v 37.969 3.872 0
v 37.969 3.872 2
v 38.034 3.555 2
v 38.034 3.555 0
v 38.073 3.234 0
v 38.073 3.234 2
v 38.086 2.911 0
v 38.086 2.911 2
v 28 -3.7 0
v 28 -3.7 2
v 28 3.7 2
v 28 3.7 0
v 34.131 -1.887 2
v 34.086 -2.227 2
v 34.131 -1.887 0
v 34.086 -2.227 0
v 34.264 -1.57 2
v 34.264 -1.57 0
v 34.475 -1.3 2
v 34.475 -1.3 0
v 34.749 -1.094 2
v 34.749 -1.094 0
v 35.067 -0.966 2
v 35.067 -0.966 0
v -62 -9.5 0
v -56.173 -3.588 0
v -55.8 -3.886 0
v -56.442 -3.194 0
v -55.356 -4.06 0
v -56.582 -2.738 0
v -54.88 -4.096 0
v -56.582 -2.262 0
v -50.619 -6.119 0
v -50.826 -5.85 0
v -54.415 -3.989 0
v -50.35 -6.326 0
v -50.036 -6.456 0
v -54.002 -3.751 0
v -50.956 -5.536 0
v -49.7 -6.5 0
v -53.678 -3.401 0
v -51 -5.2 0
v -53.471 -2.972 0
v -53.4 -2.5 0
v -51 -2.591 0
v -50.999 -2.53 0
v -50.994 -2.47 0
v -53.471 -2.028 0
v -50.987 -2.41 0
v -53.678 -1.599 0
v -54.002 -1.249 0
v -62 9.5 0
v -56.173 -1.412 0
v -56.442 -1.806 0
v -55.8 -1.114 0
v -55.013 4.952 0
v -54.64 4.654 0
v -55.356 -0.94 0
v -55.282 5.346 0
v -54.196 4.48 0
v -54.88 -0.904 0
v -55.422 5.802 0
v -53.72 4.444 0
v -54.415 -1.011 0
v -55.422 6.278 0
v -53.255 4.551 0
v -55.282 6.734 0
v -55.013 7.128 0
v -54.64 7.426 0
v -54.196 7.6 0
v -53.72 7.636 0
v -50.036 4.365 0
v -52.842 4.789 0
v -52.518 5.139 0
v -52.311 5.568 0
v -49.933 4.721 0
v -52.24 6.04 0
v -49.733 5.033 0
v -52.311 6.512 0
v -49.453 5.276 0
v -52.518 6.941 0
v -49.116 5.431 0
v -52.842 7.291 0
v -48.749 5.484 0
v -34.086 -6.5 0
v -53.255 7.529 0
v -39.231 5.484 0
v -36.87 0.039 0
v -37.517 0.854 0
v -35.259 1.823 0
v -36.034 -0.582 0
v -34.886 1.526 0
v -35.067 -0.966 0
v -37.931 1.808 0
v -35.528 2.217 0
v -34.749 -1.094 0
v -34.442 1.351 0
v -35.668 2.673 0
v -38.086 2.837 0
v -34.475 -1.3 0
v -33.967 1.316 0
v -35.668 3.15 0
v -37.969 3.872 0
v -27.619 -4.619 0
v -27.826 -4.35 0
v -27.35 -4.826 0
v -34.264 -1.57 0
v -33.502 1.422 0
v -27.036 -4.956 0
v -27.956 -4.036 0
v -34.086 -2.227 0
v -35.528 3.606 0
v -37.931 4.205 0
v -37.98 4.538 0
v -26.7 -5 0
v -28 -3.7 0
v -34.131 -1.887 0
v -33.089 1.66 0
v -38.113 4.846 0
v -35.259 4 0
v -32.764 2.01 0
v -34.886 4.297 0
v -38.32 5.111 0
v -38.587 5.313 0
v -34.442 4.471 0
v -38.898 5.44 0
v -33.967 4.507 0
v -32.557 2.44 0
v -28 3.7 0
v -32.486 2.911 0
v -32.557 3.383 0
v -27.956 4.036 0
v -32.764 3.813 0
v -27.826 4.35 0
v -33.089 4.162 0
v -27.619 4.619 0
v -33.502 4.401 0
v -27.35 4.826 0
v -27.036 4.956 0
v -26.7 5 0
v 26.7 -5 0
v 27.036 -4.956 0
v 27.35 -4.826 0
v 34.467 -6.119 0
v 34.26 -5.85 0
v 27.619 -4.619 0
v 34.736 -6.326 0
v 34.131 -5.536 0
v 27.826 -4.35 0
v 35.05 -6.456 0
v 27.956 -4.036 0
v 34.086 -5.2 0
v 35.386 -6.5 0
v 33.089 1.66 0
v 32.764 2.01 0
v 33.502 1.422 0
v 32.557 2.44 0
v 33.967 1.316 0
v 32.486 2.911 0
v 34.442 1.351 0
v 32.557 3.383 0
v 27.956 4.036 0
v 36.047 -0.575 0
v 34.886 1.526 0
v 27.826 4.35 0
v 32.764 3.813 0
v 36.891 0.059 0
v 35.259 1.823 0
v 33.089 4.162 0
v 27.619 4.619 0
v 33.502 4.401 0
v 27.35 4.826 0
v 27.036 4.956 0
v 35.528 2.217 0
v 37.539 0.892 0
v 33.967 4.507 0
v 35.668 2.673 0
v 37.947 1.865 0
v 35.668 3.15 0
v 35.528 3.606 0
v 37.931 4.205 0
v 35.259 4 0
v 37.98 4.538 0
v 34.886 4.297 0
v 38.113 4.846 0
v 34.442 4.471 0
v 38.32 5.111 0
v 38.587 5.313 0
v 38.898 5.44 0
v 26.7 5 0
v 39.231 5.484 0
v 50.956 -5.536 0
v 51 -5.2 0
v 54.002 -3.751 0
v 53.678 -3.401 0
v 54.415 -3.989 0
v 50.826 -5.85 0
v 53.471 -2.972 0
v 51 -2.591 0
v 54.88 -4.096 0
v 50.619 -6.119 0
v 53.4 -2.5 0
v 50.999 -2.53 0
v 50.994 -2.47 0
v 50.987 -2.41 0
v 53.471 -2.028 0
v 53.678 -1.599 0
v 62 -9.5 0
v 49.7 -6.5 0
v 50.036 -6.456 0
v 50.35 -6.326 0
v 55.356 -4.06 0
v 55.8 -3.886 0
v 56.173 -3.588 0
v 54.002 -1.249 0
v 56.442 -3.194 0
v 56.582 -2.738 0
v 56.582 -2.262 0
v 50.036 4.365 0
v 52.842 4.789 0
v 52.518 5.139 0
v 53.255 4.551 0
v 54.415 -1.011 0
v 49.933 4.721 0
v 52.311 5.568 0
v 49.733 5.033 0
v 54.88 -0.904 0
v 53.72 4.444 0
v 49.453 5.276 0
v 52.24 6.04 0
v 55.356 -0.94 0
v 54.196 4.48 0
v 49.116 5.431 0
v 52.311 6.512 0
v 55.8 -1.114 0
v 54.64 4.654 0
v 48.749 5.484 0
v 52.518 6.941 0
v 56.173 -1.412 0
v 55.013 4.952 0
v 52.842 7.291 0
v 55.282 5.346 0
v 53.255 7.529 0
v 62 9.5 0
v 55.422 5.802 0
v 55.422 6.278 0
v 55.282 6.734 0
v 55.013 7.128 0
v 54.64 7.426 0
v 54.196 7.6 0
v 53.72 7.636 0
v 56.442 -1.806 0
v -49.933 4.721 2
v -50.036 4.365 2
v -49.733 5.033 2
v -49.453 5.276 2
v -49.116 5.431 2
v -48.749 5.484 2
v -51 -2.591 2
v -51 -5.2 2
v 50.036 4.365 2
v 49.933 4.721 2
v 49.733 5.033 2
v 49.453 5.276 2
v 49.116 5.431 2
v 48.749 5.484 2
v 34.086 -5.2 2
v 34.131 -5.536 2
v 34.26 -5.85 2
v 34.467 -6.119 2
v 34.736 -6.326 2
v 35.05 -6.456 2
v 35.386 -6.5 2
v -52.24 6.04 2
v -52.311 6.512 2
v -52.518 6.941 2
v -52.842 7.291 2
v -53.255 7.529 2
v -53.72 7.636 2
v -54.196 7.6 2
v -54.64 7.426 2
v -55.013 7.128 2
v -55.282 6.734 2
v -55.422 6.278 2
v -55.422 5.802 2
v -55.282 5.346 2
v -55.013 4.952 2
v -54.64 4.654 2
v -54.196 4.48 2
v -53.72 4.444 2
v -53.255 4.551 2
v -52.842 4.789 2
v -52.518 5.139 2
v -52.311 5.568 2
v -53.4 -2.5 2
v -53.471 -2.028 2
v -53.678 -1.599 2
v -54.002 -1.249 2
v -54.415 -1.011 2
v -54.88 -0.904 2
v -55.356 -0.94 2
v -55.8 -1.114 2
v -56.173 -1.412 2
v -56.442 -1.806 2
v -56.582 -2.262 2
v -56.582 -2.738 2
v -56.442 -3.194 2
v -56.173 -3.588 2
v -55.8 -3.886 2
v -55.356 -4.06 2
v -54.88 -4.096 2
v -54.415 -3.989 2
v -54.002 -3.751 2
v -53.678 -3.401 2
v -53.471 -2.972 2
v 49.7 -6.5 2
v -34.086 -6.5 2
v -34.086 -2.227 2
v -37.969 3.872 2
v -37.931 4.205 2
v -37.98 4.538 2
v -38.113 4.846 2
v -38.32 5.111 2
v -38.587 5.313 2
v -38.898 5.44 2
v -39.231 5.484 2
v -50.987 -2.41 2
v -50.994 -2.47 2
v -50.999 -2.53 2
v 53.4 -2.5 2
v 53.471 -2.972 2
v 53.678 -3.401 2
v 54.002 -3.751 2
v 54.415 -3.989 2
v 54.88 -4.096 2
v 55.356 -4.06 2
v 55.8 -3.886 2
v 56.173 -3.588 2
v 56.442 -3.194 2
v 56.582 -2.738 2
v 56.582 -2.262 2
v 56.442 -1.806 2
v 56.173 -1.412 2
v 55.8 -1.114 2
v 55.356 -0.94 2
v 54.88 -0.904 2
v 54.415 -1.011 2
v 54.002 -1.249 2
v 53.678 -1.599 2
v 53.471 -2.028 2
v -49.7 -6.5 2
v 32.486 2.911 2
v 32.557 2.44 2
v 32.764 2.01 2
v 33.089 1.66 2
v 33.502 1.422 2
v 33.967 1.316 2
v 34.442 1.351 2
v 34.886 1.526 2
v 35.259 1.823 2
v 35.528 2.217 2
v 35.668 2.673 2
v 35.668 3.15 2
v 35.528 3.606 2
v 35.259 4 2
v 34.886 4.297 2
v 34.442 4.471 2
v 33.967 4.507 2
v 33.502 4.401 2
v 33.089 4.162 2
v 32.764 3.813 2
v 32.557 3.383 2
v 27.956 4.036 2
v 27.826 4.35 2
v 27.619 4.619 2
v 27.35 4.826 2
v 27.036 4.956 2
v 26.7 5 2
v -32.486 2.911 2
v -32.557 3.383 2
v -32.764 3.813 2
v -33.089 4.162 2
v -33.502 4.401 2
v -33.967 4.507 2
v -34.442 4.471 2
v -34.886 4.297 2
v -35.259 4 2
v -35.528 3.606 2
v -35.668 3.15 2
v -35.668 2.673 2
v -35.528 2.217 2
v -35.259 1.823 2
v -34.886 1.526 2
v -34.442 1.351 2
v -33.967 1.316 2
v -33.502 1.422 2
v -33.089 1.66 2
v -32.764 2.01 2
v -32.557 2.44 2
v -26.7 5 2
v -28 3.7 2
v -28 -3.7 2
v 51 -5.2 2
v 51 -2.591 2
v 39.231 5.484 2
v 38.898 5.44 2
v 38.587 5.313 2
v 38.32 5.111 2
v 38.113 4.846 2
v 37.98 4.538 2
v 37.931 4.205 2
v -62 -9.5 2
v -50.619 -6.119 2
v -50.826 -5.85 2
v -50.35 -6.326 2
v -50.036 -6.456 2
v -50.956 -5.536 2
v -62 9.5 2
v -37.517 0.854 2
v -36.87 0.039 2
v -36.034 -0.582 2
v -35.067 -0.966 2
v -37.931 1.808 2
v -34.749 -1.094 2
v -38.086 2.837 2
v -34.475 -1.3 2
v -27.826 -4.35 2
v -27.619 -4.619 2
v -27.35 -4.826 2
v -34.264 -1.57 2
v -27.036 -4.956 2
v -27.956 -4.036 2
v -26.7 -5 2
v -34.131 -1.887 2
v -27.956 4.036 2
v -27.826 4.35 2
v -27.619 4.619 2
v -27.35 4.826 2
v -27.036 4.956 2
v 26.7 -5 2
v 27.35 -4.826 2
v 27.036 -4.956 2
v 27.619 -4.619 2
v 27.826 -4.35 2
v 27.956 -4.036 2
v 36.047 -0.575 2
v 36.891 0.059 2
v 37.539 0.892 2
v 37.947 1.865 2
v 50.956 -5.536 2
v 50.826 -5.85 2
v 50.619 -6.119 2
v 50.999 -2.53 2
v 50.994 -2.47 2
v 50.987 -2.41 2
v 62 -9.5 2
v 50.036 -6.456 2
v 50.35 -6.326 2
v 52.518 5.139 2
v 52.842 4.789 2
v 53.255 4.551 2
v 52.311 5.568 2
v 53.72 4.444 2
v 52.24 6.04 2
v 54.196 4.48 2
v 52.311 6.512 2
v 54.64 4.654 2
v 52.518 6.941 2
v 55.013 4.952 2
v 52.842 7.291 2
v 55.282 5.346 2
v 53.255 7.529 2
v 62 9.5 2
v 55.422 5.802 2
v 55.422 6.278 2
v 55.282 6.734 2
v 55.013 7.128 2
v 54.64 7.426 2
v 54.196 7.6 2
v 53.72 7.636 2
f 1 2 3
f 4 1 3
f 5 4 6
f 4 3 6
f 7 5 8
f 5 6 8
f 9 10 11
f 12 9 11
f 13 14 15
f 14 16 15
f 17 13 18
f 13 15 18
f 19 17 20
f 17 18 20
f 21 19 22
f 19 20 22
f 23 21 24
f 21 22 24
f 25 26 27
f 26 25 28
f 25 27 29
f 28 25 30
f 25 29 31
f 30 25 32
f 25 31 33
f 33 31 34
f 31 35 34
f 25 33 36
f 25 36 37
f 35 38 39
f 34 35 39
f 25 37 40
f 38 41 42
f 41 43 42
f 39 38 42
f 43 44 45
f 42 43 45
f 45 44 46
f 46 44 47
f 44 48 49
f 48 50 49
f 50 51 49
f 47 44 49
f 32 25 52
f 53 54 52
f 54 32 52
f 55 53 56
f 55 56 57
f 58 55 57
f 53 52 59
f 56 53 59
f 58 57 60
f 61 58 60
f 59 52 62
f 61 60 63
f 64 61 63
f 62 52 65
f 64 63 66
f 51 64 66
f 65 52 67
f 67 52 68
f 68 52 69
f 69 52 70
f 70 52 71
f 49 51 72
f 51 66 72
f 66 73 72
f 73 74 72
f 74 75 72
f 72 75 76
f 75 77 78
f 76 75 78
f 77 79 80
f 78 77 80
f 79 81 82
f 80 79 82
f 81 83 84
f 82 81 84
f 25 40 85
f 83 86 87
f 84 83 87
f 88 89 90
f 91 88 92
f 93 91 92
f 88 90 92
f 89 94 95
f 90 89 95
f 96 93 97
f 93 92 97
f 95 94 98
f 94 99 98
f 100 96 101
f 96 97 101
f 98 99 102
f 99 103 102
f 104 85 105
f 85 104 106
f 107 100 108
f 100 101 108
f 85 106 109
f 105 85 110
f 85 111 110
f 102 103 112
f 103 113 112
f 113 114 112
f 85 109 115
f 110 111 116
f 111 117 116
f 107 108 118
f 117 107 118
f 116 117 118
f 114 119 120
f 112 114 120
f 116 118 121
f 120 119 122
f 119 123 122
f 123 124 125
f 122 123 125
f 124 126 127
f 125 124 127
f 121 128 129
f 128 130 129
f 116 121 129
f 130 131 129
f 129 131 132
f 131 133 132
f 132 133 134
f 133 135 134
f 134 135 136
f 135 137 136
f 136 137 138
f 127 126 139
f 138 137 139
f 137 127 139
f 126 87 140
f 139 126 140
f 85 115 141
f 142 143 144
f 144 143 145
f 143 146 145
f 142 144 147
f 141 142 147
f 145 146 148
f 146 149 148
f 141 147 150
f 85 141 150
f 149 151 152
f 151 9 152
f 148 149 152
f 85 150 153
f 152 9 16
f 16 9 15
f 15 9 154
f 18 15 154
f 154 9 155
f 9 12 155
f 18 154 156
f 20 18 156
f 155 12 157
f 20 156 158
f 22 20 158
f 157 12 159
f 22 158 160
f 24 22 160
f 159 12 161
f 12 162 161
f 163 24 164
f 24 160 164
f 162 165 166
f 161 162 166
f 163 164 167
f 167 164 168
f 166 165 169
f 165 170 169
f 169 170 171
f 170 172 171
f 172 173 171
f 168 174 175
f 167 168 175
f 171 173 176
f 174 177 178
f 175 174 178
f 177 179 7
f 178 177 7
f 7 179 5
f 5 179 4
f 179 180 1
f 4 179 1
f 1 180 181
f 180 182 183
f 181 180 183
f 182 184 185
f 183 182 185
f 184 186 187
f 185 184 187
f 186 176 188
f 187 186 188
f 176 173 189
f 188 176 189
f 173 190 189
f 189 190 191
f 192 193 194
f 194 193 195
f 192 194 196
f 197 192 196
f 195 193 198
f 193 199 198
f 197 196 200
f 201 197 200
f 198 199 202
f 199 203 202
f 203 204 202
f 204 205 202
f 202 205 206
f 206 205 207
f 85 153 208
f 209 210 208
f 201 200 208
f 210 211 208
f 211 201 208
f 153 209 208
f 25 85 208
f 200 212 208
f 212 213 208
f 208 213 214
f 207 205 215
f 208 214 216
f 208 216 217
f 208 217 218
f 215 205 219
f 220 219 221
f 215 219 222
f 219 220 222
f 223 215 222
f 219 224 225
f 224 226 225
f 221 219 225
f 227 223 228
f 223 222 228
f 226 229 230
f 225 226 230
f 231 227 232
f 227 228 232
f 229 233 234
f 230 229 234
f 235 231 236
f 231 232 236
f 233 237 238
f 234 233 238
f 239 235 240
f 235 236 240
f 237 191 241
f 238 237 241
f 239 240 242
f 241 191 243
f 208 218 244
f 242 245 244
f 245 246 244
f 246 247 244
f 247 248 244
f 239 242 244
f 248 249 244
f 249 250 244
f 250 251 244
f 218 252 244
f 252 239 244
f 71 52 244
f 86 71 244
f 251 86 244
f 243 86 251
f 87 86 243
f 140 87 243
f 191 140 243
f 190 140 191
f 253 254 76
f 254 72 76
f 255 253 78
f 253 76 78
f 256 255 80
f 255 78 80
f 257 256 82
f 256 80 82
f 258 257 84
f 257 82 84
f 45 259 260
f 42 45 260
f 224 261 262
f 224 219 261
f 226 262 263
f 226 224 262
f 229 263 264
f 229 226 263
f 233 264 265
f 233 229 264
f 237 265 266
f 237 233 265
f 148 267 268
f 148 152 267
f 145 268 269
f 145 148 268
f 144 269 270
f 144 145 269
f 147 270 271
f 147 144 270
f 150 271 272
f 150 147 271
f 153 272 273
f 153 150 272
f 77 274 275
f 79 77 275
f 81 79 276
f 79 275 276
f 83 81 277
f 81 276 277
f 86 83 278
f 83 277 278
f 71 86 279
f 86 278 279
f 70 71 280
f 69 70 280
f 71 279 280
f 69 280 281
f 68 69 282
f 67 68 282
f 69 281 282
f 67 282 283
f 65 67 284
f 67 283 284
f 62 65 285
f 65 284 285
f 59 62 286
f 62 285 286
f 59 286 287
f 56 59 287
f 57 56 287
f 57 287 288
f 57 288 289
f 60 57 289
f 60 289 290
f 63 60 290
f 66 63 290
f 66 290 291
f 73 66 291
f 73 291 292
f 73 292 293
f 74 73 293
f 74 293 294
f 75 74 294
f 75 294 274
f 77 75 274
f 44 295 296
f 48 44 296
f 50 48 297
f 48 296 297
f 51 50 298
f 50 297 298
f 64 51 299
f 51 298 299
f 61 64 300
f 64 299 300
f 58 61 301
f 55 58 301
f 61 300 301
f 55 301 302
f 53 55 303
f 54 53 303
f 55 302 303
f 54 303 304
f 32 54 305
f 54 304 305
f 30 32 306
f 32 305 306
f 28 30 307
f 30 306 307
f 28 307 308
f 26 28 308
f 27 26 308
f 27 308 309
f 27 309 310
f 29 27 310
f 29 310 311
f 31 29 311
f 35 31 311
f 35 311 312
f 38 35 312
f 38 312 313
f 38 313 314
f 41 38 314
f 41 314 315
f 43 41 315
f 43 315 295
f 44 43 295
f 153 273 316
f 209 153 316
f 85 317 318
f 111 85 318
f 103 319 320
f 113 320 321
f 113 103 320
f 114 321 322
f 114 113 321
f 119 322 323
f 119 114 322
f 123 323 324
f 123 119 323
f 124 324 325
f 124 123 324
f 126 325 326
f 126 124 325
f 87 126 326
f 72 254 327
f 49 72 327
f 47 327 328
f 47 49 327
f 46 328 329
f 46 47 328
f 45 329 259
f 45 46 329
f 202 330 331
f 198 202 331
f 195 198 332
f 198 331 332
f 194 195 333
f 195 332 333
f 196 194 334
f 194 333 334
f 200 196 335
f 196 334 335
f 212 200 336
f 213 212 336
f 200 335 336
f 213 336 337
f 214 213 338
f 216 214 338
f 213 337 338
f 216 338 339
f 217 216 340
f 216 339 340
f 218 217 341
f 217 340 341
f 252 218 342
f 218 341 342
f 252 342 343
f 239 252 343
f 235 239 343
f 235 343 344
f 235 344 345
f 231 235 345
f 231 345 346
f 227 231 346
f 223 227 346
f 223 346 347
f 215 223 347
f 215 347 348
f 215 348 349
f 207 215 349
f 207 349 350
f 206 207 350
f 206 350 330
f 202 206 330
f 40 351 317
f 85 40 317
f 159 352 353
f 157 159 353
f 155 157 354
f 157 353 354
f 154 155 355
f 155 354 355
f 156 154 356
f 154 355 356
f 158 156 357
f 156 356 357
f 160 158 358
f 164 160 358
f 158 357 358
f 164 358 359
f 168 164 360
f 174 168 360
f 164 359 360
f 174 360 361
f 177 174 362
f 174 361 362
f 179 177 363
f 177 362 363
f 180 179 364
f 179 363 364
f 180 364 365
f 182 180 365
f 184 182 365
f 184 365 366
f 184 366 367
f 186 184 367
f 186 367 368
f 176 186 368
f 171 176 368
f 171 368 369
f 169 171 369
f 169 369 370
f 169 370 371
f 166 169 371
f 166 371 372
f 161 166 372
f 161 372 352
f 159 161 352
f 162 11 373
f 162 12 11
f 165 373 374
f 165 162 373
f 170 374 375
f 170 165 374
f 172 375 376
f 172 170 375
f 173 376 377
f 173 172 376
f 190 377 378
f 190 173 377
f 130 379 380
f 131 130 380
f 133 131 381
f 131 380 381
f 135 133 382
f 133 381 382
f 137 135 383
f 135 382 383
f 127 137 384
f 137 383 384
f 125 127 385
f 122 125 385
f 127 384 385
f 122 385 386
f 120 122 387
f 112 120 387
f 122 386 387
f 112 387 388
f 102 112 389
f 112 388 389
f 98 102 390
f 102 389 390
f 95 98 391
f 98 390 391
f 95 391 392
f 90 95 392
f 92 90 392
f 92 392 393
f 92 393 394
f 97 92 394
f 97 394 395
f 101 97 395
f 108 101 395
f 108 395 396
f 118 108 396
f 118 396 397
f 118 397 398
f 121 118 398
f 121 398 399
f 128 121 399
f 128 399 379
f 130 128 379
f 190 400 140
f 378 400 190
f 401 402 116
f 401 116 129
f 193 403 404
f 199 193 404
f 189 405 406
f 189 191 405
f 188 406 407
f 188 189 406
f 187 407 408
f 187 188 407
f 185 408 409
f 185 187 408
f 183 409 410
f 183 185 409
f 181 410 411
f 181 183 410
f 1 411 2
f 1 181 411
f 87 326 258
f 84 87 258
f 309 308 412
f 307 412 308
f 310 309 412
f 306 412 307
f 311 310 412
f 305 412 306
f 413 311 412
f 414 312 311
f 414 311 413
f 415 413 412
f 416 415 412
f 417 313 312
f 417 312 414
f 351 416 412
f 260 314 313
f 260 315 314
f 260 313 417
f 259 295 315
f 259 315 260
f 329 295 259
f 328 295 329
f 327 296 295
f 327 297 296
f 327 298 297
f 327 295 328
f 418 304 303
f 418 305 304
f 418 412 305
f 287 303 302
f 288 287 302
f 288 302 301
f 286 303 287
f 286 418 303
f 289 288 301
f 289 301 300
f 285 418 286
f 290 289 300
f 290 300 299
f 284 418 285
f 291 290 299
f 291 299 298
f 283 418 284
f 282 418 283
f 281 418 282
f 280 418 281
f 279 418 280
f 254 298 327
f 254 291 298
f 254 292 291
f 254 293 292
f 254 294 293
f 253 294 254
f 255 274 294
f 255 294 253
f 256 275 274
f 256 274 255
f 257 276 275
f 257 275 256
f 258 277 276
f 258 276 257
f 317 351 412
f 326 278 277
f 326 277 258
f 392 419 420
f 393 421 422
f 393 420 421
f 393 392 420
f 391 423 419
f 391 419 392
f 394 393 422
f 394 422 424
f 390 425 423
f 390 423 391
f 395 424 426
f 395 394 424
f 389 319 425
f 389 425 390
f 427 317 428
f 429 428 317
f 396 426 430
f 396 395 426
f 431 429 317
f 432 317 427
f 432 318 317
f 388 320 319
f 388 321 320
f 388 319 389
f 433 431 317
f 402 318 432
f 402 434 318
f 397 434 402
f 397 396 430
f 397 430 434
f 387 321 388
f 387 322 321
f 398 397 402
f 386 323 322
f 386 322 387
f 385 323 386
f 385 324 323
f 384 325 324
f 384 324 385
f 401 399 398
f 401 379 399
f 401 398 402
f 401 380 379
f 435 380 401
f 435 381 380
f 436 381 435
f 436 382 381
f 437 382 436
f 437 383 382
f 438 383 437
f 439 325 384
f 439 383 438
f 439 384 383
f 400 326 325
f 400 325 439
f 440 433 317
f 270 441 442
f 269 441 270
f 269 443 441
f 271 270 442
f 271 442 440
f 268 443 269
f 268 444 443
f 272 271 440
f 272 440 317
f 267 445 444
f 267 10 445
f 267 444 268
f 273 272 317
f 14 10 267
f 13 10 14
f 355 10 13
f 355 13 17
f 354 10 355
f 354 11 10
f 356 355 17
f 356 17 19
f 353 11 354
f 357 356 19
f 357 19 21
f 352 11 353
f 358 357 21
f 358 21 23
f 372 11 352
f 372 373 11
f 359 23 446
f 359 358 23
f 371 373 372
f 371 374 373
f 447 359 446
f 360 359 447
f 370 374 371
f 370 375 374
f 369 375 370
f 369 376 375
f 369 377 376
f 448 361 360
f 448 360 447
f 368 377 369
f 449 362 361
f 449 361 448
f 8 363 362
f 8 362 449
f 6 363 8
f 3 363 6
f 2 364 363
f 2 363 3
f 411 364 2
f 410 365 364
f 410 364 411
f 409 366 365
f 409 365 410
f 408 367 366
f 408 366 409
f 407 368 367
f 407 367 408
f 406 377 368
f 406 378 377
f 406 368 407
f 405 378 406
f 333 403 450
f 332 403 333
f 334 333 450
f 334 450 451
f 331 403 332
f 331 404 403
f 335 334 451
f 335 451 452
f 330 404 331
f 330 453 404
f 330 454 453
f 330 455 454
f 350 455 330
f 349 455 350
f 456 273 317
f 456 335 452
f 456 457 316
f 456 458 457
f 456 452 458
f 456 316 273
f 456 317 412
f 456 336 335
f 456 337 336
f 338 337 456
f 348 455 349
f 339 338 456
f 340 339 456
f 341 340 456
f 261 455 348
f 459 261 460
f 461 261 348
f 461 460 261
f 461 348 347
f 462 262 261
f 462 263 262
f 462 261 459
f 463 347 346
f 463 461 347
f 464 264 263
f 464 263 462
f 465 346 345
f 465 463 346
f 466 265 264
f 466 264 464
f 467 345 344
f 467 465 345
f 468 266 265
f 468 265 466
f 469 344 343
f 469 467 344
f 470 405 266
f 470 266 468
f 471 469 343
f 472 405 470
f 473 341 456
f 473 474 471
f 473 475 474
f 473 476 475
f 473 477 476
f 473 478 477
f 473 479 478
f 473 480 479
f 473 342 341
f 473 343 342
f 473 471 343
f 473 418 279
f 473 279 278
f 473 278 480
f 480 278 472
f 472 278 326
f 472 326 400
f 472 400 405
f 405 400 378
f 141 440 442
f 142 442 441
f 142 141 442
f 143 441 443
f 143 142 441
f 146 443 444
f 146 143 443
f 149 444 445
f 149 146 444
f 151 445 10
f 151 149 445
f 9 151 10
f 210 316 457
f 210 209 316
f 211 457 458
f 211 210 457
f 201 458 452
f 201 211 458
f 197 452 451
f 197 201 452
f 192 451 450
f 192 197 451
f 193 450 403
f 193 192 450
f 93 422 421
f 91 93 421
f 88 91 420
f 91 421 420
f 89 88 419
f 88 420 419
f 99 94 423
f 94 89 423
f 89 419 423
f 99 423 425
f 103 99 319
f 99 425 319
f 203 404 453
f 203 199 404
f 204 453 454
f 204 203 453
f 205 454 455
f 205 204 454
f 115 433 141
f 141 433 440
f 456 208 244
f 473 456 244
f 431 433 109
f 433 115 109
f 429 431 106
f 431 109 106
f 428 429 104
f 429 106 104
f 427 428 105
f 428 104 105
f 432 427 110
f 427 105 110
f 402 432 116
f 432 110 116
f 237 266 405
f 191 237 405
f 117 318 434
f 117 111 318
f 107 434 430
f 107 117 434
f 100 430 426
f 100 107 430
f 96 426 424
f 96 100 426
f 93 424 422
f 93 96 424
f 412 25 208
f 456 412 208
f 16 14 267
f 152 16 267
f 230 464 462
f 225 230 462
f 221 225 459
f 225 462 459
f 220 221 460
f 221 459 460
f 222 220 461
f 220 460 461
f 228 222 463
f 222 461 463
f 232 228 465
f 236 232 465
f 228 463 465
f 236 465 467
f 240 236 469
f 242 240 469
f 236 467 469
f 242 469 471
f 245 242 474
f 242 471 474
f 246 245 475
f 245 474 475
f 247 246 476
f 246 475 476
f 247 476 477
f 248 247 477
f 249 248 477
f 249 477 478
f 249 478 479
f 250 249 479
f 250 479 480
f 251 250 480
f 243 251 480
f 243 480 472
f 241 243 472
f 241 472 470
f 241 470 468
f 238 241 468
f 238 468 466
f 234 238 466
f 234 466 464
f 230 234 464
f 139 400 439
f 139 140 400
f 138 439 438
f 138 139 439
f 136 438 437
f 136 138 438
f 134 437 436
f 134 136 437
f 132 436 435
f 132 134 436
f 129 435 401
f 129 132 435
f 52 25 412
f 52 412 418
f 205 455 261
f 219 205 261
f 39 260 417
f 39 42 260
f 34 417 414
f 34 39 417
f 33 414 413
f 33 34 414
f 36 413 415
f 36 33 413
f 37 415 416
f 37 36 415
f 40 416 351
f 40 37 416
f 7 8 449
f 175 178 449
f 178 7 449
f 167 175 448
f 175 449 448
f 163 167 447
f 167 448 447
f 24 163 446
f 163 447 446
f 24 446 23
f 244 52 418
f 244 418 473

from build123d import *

# Parameters (mm, degrees)
SKETCH_1_W          = 124
SKETCH_1_H          = 19
EXTRUDE_1_DEPTH     = 2
SKETCH_3_R          = 1.6
CUT_EXTRUDE_2_DEPTH = 63.755477849
SKETCH_4_R          = 1.6
CUT_EXTRUDE_3_DEPTH = 63.755477849
SKETCH_5_W          = 56
SKETCH_5_H          = 10
CUT_EXTRUDE_4_DEPTH = 63.755477849
FILLET_1_R          = 1.3


with BuildPart() as part:
    # 草图1 → 凸台-拉伸1 (new body)
    with BuildSketch(Plane.XY):
        Rectangle(SKETCH_1_W, SKETCH_1_H)
    extrude(amount=EXTRUDE_1_DEPTH)

    # 草图3 → 切除-拉伸2 (cut, through all)
    with BuildSketch(Plane.XY.offset(2)):
        with Locations((-55, -2.5)):
            Circle(SKETCH_3_R)
        with Locations(Location((55, -2.5, 0), (0, 0, 180))):
            Circle(SKETCH_3_R)
    extrude(amount=-CUT_EXTRUDE_2_DEPTH, mode=Mode.SUBTRACT)

    # 草图4 → 切除-拉伸3 (cut, through all)
    with BuildSketch(Plane.XY.offset(2)):
        with Locations((-53.84, 6.04)):
            Circle(SKETCH_4_R)
        with Locations((-34.086233188, 2.911310699)):
            Circle(SKETCH_4_R)
        with Locations(Location((34.086233188, 2.911310699, 0), (0, 0, 180))):
            Circle(SKETCH_4_R)
        with Locations(Location((53.84, 6.04, 0), (0, 0, 180))):
            Circle(SKETCH_4_R)
    extrude(amount=-CUT_EXTRUDE_3_DEPTH, mode=Mode.SUBTRACT)

    # 草图5 → 切除-拉伸4 (cut, through all)
    with BuildSketch(Plane.XY.offset(2)):
        with BuildLine():
            Line((-49.87886563, 5.483749603), (-51, -2.5))
            Line((-51, -2.5), (-51, -6.5))
            Line((-51, -6.5), (-34.086233188, -6.5))
            Line((-34.086233188, -6.5), (-34.086233188, -1.088689301))
            ThreePointArc((-34.086233188, -1.088689301), (-37.711819735, 1.221600016), (-37.149329348, 5.483749603))
            Line((-37.149329348, 5.483749603), (-49.87886563, 5.483749603))
        make_face()
        Rectangle(SKETCH_5_W, SKETCH_5_H)
        with BuildLine():
            Line((34.086233188, -1.088689301), (34.086233188, -6.5))
            Line((34.086233188, -6.5), (51, -6.5))
            Line((51, -6.5), (51, -2.5))
            Line((51, -2.5), (49.87886563, 5.483749603))
            Line((49.87886563, 5.483749603), (37.149329348, 5.483749603))
            ThreePointArc((37.149329348, 5.483749603), (37.844715903, 4.28018165), (38.086233188, 2.911310699))
            ThreePointArc((38.086233188, 2.911310699), (36.914660313, 0.082883574), (34.086233188, -1.088689301))
        make_face()
    extrude(amount=-CUT_EXTRUDE_4_DEPTH, mode=Mode.SUBTRACT)

    # 圆角1
    fillet_1_edges = [part.edges().sort_by_distance(p)[0] for p in [
        (-37.149329348, 5.483749603, 1),
        (-34.086233188, -1.088689301, 1),
        (-51, -6.5, 1),
        (-51, -2.5, 1),
        (-49.87886563, 5.483749603, 1),
        (-28, -5, 1),
        (-28, 5, 1),
        (28, 5, 1),
        (28, -5, 1),
        (37.149329348, 5.483749603, 1),
        (49.87886563, 5.483749603, 1),
        (51, -2.5, 1),
        (51, -6.5, 1),
        (34.086233188, -6.5, 1),
        (34.086233188, -1.088689301, 1),
    ]]
    fillet(fillet_1_edges, radius=FILLET_1_R)


solid = part.part
